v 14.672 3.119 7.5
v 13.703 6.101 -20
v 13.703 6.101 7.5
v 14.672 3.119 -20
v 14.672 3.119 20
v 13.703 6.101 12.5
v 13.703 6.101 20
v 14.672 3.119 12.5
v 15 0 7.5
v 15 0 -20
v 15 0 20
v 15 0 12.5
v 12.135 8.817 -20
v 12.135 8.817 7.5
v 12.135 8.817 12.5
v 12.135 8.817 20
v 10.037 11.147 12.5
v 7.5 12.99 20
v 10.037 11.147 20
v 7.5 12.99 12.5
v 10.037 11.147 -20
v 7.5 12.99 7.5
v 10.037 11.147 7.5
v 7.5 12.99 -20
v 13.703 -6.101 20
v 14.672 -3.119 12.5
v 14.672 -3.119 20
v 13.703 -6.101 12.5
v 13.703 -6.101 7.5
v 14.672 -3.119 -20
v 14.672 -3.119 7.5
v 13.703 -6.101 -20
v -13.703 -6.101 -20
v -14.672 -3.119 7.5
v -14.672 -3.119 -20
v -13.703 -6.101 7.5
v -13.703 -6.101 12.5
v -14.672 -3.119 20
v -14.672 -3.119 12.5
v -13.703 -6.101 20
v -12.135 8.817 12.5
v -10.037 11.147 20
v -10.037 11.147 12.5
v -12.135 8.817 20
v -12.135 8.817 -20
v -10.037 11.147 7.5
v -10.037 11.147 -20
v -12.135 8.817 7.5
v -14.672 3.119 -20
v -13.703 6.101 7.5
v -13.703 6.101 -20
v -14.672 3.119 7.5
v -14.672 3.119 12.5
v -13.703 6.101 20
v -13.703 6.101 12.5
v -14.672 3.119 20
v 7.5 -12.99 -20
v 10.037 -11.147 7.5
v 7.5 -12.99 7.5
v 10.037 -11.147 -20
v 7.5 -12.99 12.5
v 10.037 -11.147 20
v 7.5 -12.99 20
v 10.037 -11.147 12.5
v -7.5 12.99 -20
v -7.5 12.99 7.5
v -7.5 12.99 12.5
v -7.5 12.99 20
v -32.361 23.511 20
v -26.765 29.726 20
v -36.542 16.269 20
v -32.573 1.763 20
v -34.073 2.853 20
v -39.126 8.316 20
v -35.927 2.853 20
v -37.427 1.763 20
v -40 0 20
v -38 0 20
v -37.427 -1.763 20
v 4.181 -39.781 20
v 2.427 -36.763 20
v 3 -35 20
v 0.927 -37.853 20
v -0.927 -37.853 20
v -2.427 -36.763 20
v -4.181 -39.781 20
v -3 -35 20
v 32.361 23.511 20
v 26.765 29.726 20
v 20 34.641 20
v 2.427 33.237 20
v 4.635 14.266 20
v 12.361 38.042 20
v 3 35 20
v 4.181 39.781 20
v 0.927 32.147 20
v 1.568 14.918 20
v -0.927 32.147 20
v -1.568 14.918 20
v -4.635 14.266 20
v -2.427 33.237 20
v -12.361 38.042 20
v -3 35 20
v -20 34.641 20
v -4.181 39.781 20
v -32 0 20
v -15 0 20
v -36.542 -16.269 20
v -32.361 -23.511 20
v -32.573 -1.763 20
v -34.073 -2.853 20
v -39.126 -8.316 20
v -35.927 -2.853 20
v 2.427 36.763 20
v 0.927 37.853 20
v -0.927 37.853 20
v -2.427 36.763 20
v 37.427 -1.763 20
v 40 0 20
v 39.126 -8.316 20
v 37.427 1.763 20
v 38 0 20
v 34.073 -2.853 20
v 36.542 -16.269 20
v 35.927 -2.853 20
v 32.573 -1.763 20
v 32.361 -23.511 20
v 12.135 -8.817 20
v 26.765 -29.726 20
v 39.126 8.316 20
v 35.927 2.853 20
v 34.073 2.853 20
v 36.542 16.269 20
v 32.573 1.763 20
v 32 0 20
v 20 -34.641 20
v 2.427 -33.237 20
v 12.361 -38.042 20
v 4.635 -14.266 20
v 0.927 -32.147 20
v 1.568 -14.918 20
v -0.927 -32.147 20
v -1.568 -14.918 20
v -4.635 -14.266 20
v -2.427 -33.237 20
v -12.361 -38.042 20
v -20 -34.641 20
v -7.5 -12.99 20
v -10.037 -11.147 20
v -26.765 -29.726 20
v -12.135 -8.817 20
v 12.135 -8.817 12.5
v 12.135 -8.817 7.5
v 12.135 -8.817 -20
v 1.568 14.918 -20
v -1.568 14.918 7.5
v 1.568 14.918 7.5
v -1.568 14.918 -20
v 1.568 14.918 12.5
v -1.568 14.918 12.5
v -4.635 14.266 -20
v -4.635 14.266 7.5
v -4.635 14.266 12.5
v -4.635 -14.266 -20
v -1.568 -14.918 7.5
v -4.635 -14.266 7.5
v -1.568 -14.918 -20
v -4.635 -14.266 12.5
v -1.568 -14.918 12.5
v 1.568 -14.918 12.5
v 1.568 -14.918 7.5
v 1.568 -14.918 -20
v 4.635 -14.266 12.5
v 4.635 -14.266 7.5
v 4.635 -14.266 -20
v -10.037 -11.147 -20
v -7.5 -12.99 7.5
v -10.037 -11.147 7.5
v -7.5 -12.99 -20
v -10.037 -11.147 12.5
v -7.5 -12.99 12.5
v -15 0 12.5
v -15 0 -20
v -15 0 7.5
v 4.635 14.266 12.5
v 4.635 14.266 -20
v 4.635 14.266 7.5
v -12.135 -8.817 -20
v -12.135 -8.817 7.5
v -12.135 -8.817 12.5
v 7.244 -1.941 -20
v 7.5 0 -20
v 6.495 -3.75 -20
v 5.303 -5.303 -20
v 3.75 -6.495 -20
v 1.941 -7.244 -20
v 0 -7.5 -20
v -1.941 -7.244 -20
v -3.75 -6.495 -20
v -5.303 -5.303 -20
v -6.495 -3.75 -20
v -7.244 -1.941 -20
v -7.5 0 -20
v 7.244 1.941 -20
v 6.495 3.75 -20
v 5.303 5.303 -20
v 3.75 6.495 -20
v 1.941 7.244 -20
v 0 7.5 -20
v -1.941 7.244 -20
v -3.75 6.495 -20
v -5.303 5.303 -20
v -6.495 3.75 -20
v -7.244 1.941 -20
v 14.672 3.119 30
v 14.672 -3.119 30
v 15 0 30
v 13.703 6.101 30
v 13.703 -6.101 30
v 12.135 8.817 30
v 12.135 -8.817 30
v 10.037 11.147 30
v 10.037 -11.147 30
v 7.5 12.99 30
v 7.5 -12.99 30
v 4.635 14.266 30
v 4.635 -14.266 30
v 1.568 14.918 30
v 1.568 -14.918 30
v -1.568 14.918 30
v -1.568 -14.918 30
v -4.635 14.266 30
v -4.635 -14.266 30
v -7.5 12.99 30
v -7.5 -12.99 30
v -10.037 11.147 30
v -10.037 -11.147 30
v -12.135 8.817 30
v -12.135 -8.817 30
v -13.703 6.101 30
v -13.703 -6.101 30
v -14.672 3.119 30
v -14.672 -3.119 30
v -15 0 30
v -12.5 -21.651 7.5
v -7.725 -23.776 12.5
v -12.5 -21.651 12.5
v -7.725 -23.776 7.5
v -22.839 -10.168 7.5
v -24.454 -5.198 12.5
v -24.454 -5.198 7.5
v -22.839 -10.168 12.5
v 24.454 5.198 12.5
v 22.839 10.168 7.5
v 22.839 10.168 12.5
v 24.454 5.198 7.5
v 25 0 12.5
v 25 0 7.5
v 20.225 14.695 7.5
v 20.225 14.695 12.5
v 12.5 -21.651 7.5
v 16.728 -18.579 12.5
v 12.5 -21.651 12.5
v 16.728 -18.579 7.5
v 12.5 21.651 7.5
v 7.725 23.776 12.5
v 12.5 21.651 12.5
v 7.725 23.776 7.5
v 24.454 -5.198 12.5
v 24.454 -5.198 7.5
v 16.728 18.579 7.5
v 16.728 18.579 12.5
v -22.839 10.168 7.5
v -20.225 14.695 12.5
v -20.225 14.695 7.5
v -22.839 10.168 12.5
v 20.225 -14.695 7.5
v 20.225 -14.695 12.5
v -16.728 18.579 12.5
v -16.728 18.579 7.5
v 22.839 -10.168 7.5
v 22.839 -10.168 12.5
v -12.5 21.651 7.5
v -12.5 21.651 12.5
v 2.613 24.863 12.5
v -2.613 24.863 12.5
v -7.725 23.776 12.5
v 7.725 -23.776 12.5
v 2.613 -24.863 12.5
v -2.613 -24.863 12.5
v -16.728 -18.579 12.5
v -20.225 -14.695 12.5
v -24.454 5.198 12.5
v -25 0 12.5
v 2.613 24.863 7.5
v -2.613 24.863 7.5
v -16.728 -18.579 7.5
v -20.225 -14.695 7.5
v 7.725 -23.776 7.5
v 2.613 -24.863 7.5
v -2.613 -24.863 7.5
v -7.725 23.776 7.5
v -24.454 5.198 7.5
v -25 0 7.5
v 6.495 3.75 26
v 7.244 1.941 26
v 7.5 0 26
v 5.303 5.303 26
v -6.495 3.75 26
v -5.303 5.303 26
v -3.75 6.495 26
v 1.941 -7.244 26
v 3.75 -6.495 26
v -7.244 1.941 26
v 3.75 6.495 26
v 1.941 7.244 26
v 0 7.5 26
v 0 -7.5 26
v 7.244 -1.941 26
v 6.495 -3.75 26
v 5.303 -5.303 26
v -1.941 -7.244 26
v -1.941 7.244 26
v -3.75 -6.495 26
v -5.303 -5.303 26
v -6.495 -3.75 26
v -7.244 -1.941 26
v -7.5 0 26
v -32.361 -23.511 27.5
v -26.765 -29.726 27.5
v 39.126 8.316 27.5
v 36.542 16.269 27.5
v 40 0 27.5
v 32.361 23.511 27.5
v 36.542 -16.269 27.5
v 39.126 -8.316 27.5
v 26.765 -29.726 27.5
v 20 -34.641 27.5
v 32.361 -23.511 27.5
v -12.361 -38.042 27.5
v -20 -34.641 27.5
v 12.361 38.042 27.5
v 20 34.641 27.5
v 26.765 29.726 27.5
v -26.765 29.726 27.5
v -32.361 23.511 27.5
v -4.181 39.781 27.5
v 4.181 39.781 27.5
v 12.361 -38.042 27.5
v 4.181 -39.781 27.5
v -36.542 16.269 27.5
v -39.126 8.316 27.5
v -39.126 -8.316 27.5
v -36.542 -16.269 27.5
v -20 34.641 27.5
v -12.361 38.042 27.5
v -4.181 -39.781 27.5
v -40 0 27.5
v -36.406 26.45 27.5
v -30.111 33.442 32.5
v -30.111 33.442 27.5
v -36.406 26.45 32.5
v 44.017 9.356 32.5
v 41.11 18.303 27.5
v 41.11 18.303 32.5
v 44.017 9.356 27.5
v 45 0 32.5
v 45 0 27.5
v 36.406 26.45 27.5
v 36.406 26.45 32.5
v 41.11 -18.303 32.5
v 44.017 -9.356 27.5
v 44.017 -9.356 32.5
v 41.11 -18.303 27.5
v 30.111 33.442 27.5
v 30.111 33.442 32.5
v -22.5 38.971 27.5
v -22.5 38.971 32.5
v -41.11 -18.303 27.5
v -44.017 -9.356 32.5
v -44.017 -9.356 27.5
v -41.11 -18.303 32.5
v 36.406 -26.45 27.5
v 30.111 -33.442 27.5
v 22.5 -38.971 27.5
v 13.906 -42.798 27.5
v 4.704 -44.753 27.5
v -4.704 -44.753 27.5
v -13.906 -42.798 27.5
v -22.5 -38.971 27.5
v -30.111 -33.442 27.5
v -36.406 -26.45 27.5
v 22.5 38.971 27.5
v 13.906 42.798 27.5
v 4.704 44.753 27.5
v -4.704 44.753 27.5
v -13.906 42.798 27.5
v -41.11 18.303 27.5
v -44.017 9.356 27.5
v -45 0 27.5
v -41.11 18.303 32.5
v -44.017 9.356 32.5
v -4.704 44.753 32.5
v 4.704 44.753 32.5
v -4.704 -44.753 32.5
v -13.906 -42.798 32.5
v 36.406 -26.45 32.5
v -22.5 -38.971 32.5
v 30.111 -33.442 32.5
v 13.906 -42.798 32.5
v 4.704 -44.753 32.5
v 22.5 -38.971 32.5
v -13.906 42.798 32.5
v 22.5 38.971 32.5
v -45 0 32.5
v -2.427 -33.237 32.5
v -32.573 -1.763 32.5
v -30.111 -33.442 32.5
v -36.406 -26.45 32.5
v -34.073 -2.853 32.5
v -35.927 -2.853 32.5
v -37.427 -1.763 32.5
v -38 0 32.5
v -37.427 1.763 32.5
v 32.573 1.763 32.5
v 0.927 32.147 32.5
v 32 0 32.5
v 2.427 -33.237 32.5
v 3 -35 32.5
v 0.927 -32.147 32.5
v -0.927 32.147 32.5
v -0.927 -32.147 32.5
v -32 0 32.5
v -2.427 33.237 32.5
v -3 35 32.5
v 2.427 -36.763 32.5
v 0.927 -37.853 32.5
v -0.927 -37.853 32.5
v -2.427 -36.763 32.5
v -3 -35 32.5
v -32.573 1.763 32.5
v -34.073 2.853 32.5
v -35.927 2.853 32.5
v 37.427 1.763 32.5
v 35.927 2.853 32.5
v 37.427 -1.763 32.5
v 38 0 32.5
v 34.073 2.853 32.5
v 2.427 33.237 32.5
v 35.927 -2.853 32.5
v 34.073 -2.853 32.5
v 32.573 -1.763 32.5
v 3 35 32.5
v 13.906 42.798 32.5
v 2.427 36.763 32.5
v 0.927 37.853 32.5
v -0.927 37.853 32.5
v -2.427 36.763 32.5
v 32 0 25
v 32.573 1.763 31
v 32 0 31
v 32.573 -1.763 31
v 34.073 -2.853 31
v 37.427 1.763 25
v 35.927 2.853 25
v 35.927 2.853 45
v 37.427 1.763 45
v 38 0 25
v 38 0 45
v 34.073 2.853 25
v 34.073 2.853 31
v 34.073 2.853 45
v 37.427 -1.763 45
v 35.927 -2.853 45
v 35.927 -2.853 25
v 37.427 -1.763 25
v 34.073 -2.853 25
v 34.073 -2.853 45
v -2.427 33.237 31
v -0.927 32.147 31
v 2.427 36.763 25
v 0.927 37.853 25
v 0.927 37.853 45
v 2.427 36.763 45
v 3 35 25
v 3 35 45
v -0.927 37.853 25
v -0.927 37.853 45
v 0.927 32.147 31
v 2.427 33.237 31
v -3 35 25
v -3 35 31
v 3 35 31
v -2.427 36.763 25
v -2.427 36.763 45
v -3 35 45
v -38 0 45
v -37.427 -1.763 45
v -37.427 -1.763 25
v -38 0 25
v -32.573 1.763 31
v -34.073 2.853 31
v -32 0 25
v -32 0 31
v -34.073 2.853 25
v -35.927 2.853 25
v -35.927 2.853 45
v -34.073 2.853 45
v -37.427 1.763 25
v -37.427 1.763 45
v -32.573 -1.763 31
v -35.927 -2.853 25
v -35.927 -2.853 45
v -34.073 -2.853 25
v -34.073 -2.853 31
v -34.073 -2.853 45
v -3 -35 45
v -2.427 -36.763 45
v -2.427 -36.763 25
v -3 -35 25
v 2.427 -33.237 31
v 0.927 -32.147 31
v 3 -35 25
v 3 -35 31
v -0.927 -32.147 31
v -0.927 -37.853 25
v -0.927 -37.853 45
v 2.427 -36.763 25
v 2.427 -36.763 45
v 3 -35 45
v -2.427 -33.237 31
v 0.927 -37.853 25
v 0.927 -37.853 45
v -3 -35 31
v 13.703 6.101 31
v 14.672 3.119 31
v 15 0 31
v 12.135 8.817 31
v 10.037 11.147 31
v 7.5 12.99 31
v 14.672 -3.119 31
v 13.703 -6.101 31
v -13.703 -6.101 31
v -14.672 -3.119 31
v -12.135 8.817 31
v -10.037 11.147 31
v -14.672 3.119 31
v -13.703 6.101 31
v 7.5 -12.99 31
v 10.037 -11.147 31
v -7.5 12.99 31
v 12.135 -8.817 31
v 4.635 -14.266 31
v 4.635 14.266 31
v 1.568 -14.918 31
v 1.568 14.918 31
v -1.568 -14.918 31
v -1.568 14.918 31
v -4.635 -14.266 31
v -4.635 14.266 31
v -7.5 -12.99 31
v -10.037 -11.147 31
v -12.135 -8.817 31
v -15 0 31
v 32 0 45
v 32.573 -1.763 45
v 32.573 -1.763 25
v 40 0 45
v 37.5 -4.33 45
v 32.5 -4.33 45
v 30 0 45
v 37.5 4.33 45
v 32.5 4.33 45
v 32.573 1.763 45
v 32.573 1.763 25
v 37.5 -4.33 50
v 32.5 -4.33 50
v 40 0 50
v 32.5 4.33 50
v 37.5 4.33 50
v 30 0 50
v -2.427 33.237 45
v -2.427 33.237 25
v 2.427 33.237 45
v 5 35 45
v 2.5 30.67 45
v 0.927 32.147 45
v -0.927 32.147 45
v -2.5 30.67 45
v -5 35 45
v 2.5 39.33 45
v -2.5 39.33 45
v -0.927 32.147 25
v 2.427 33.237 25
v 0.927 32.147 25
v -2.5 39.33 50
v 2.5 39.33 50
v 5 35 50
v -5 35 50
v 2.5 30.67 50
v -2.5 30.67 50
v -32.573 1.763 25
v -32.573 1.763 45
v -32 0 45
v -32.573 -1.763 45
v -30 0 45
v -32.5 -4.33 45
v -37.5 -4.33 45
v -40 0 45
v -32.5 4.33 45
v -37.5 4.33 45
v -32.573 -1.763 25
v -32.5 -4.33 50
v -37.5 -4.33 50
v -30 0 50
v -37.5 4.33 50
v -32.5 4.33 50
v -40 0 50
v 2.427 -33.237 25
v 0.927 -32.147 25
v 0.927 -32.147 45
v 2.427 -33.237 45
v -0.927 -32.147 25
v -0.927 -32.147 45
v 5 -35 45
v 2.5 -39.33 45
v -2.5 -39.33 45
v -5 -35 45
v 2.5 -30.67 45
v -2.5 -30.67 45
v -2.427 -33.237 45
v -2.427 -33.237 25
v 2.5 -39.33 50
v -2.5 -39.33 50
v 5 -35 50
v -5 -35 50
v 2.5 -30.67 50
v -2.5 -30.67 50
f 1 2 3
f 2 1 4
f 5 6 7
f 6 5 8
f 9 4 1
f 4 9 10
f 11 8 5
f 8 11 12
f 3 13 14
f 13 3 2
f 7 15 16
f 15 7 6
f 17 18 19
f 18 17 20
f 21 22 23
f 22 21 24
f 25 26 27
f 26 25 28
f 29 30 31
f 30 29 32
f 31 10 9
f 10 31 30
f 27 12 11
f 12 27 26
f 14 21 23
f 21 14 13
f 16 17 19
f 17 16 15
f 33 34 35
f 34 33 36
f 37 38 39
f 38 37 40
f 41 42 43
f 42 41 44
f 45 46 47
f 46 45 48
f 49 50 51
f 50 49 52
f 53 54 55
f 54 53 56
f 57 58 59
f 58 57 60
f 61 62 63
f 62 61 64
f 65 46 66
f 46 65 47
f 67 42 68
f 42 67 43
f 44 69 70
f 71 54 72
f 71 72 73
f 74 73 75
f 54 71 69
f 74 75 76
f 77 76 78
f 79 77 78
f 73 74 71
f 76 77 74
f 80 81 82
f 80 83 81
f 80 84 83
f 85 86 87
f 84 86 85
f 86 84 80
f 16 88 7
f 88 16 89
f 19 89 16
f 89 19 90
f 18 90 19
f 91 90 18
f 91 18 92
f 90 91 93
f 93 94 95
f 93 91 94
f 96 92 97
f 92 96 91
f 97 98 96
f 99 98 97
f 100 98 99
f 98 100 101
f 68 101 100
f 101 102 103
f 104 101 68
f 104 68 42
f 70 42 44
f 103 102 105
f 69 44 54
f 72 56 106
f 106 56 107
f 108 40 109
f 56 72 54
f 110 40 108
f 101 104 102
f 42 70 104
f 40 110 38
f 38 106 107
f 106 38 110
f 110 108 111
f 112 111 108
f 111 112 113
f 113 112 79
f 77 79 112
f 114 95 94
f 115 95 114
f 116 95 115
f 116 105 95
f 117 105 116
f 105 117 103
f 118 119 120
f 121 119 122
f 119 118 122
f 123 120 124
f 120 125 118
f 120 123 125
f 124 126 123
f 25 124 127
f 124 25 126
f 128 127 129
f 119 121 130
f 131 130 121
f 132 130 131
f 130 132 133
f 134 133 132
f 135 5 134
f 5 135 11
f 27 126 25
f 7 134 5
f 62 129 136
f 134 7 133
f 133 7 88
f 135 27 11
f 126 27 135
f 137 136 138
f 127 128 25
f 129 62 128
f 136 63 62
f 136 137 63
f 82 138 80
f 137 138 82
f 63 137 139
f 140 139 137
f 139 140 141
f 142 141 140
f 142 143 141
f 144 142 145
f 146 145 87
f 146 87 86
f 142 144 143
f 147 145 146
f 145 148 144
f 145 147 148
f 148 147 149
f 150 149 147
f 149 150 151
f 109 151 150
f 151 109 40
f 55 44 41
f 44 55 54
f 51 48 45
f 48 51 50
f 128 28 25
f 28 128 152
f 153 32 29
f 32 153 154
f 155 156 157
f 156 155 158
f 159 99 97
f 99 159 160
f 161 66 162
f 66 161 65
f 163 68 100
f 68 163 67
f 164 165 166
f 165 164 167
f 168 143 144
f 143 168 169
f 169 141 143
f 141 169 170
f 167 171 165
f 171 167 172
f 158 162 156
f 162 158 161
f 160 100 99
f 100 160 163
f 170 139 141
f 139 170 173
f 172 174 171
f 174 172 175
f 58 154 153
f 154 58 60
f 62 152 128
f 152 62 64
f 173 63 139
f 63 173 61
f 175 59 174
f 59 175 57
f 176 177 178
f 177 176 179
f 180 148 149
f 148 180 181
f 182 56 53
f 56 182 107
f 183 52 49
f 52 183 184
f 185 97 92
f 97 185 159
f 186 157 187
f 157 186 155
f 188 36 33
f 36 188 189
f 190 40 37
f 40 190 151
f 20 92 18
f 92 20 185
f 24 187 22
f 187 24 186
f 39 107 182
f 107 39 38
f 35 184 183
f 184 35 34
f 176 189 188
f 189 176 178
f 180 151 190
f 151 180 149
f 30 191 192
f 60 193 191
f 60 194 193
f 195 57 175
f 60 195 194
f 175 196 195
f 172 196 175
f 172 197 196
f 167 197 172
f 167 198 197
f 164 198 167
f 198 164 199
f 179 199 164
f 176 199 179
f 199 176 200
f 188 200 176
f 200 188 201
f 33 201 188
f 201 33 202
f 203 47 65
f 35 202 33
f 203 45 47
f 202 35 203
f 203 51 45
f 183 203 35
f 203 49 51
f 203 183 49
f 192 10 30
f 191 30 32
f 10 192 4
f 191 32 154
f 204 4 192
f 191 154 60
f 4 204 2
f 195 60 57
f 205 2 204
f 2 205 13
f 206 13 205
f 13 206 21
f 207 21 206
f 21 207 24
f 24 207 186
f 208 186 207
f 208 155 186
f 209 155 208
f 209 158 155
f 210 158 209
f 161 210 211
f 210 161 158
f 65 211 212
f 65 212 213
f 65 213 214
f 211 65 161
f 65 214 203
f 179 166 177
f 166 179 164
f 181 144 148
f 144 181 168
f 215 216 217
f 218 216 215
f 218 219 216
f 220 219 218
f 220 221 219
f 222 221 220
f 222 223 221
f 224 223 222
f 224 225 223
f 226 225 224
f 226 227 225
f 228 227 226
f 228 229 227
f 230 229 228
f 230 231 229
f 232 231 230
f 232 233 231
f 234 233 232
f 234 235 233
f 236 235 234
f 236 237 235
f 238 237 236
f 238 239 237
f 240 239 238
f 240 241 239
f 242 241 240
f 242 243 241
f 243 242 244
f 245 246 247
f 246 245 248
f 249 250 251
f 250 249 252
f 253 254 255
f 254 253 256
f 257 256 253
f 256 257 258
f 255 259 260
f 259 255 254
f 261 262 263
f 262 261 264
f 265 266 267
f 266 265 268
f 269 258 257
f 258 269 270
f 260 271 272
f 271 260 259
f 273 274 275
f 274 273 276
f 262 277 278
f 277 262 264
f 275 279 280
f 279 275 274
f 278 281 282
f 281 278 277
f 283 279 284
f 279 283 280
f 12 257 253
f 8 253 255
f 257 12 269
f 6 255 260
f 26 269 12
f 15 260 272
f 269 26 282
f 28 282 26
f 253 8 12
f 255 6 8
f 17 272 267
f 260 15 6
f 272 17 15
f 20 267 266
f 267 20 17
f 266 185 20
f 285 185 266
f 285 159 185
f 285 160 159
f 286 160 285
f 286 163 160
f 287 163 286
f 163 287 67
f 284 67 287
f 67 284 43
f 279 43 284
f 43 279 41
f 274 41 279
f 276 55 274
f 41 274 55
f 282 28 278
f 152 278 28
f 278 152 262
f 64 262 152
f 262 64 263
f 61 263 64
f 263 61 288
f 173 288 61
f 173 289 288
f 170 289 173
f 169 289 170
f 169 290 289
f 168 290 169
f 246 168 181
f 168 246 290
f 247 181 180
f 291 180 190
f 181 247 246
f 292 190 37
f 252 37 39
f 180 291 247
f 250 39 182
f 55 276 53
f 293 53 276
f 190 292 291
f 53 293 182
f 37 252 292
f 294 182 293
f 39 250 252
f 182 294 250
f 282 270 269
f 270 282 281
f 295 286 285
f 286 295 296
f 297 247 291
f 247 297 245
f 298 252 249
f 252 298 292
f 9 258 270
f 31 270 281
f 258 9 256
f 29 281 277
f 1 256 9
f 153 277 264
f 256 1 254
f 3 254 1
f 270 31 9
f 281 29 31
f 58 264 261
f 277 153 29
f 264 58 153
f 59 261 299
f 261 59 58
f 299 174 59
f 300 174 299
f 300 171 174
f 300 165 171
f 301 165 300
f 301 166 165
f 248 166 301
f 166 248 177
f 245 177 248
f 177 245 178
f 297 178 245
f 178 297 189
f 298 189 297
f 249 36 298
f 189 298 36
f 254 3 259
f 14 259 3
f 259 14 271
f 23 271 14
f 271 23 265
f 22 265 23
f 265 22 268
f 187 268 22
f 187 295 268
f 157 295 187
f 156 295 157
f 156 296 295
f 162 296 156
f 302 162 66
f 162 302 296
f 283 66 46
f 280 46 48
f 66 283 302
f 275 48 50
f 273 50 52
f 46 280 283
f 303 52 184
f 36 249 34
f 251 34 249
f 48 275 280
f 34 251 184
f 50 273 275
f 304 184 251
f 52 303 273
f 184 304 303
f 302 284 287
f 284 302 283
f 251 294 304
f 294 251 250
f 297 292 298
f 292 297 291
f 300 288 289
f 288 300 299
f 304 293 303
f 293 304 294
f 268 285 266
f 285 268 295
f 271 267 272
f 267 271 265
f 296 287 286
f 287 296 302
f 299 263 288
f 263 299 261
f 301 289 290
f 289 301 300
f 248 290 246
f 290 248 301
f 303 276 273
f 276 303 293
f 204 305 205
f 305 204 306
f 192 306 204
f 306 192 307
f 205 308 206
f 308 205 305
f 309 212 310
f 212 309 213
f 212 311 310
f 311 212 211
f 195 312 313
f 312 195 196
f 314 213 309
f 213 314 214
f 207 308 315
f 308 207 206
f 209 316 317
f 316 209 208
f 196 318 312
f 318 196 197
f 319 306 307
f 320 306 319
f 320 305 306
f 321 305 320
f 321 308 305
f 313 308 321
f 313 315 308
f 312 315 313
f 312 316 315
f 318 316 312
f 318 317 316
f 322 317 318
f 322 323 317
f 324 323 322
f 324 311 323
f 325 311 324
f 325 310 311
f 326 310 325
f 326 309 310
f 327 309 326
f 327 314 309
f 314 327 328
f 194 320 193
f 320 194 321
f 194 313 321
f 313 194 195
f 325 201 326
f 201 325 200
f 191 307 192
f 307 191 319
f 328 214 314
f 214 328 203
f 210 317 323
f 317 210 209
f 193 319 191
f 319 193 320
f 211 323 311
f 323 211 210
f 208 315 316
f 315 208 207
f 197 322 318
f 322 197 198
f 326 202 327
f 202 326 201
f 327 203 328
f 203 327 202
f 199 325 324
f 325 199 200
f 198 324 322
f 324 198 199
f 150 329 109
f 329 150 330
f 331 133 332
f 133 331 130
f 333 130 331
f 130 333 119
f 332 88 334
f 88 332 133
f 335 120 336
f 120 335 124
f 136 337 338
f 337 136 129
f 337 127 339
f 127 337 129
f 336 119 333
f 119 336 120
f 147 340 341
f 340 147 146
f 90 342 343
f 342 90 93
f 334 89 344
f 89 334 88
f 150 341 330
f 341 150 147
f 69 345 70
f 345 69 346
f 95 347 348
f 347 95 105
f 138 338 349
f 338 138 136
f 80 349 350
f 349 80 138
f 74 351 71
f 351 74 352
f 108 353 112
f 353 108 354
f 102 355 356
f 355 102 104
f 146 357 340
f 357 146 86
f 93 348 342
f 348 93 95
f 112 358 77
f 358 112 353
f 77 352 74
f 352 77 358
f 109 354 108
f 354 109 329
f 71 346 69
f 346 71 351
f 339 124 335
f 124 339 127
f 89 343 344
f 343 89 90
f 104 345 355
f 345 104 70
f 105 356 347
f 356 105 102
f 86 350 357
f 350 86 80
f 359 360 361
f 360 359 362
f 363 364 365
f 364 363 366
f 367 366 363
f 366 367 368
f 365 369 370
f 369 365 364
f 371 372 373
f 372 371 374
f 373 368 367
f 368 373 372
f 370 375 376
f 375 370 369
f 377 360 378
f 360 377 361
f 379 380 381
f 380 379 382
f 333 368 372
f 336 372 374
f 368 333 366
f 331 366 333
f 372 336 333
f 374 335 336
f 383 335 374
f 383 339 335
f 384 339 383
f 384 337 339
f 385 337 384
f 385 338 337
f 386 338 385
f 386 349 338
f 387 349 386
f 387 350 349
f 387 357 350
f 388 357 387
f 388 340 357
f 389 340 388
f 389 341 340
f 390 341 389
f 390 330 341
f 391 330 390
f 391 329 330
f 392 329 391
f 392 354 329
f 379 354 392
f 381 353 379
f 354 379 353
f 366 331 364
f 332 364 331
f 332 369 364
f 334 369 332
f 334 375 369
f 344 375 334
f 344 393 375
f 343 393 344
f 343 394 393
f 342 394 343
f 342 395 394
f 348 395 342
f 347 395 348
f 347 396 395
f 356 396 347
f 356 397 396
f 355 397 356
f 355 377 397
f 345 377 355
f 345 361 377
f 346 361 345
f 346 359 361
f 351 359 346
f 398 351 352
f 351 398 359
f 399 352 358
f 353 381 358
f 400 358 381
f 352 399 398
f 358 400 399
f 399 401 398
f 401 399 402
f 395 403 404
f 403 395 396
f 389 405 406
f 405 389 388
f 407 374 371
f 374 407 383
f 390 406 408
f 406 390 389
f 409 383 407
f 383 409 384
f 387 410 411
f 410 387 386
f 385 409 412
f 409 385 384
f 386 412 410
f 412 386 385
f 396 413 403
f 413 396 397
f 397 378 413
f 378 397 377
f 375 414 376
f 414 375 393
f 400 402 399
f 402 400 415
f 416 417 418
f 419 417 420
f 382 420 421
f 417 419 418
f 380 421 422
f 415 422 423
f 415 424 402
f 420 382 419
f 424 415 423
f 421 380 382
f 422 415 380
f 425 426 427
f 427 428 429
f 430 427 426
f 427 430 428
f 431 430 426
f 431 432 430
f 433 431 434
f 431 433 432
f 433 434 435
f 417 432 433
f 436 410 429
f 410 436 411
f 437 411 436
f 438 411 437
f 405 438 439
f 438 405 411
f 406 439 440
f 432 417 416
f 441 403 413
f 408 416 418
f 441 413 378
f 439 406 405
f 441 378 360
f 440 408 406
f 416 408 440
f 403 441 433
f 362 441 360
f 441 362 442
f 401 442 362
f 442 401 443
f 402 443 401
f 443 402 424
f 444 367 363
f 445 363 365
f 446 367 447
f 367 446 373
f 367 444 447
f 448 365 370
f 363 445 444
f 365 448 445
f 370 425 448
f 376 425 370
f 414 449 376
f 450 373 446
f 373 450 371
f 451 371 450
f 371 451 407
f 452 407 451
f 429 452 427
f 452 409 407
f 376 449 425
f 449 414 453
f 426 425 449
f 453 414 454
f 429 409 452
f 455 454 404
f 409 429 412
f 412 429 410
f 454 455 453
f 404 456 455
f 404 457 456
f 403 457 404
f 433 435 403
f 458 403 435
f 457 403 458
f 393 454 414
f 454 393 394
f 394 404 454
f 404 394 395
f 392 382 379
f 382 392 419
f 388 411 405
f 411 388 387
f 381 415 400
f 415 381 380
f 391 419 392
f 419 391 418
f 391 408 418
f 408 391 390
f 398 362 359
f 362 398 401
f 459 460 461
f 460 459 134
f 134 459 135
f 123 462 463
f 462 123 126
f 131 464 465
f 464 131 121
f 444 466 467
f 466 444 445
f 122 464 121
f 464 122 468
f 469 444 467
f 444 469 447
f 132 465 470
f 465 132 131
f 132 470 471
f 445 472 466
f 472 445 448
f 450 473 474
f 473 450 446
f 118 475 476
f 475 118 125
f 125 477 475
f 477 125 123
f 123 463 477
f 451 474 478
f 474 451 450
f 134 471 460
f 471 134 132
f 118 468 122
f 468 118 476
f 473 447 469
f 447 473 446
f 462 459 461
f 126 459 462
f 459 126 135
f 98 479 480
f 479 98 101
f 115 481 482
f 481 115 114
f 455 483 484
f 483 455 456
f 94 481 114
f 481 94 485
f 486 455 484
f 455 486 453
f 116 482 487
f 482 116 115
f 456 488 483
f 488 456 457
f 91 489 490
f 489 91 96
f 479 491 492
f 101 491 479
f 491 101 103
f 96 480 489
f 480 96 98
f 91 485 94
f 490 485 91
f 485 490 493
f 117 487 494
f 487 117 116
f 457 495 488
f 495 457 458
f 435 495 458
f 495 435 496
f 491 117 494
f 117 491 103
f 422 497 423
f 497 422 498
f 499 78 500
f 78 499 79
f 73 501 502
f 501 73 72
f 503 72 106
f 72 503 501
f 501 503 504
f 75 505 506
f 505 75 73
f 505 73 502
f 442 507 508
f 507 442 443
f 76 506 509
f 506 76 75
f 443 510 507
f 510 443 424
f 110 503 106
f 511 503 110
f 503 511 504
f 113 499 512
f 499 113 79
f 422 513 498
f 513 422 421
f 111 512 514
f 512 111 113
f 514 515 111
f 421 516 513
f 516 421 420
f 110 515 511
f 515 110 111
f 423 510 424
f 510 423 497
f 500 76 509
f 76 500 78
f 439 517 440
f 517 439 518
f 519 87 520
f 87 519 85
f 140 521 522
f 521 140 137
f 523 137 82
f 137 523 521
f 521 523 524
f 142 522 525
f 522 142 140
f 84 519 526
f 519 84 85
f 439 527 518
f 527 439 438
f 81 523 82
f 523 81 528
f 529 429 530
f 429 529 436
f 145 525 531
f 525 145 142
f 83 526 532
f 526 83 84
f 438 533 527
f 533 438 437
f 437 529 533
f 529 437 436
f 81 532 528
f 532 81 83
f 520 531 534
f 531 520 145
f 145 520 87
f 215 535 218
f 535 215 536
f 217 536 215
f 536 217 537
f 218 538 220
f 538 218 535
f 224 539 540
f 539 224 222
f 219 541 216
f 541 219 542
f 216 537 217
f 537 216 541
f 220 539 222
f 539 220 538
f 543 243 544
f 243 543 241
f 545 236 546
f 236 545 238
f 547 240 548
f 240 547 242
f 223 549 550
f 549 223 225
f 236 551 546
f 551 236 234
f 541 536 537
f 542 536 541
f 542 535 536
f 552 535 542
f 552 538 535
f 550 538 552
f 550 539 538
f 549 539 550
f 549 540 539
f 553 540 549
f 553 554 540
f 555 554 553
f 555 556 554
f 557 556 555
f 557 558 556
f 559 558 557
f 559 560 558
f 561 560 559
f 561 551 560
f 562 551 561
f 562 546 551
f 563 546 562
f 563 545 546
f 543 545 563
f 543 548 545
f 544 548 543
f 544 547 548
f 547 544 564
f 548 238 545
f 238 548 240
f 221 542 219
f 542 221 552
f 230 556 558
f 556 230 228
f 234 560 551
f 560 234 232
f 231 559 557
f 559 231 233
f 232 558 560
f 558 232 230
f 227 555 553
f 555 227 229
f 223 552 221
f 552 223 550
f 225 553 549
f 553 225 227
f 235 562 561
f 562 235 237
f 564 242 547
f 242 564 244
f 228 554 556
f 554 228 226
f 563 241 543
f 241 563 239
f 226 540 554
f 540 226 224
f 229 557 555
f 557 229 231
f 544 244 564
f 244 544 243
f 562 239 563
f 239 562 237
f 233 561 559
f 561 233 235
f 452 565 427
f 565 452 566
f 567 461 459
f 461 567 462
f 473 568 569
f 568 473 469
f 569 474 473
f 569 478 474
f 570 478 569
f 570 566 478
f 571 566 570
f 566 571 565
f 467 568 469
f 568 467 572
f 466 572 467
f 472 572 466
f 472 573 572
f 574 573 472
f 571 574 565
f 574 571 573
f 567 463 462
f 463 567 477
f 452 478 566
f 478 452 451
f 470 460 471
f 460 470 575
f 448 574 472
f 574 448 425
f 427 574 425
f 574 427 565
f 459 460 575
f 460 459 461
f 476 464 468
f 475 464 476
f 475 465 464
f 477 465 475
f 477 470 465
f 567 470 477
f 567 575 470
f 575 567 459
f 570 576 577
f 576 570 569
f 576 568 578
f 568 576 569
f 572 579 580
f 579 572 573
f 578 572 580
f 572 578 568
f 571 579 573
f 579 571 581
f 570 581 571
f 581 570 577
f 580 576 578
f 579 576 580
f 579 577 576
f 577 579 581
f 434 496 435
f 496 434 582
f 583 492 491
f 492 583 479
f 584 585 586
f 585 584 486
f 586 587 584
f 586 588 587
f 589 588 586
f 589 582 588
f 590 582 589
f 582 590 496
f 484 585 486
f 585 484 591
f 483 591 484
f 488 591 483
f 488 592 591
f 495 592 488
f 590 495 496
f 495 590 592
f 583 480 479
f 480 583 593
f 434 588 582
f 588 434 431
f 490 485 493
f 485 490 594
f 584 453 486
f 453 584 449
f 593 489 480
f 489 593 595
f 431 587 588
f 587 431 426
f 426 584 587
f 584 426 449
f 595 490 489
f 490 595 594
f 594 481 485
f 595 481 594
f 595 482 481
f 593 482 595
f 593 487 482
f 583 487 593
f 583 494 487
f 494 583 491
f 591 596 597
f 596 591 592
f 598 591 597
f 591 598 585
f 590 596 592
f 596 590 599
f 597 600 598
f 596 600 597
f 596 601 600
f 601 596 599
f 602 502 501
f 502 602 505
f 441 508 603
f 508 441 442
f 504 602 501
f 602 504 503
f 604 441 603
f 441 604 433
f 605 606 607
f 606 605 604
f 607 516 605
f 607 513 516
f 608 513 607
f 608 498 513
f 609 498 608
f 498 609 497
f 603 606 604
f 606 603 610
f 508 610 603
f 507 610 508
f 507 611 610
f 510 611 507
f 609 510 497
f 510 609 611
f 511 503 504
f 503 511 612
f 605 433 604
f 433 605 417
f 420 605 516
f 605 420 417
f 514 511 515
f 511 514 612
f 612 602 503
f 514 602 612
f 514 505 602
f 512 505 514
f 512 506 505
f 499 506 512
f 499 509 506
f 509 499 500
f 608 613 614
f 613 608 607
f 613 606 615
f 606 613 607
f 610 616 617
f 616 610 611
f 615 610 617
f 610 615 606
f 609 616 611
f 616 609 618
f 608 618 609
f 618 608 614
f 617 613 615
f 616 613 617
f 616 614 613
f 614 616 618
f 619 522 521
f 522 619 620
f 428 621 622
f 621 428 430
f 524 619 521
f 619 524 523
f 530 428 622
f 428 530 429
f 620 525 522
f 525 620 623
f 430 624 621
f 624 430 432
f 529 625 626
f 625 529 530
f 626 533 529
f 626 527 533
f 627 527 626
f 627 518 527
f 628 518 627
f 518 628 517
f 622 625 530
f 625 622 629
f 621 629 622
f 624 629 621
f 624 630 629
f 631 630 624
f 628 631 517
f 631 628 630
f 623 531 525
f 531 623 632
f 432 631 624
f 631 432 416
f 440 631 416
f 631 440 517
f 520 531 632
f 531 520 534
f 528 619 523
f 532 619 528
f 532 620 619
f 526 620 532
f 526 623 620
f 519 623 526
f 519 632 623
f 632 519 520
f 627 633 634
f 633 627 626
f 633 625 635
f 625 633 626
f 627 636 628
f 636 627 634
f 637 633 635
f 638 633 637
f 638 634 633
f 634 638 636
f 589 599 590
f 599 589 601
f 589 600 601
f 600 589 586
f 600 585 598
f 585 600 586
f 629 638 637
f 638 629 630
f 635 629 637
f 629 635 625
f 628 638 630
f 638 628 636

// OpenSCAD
// Parameters
hub_diameter = 30;
hub_length = 40;
shaft_hole_diameter = 15;
flange_diameter = 80;
flange_thickness = 10;
bolt_hole_radius = 35;
bolt_diameter = 6;
bolt_length = 20;
nut_size = 10;
num_bolts = 4;
flange_rim_thickness = 5;
flange_rim_diameter = 90;
hub_extension_length = 10;
hub_extension_diameter = 40;
hub_reinforcement_diameter = 50;
hub_reinforcement_thickness = 5;

// Hub module with additional structural details
module hub() {
    difference() {
        union() {
            cylinder(d=hub_diameter, h=hub_length, center=true);
            translate([0, 0, hub_length/2])
                cylinder(d=hub_extension_diameter, h=hub_extension_length, center=false);
            translate([0, 0, hub_length/4])
                cylinder(d=hub_reinforcement_diameter, h=hub_reinforcement_thickness, center=true);
        }
        cylinder(d=shaft_hole_diameter, h=hub_length+hub_extension_length+2, center=true);
    }
}

// Flange module with raised rim
module flange() {
    difference() {
        union() {
            cylinder(d=flange_diameter, h=flange_thickness, center=true);
            translate([0, 0, flange_thickness/2])
                cylinder(d=flange_rim_diameter, h=flange_rim_thickness, center=true);
        }
        cylinder(d=hub_diameter, h=flange_thickness+2, center=true);
        for (i = [0:num_bolts-1]) {
            angle = i * 360 / num_bolts;
            translate([bolt_hole_radius * cos(angle), bolt_hole_radius * sin(angle), 0])
                cylinder(d=bolt_diameter, h=flange_thickness+2, center=true);
        }
    }
}

// Bolt module with hexagonal head and threading
module bolt() {
    union() {
        cylinder(d=bolt_diameter, h=bolt_length, center=false);
        translate([0, 0, bolt_length])
            cylinder(d=nut_size, h=5, $fn=6, center=false);
    }
}

// Nut module with proper hexagonal shape
module nut() {
    cylinder(d=nut_size, h=5, $fn=6, center=false);
}

// Assemble the components
module assembly() {
    hub();
    translate([0, 0, hub_length/2 + flange_thickness/2]) flange();
    for (i = [0:num_bolts-1]) {
        angle = i * 360 / num_bolts;
        translate([bolt_hole_radius * cos(angle), bolt_hole_radius * sin(angle), hub_length/2 + flange_thickness/2])
            bolt();
        translate([bolt_hole_radius * cos(angle), bolt_hole_radius * sin(angle), hub_length/2 + flange_thickness/2 + bolt_length])
            nut();
    }
}

// Render the assembly
assembly();
